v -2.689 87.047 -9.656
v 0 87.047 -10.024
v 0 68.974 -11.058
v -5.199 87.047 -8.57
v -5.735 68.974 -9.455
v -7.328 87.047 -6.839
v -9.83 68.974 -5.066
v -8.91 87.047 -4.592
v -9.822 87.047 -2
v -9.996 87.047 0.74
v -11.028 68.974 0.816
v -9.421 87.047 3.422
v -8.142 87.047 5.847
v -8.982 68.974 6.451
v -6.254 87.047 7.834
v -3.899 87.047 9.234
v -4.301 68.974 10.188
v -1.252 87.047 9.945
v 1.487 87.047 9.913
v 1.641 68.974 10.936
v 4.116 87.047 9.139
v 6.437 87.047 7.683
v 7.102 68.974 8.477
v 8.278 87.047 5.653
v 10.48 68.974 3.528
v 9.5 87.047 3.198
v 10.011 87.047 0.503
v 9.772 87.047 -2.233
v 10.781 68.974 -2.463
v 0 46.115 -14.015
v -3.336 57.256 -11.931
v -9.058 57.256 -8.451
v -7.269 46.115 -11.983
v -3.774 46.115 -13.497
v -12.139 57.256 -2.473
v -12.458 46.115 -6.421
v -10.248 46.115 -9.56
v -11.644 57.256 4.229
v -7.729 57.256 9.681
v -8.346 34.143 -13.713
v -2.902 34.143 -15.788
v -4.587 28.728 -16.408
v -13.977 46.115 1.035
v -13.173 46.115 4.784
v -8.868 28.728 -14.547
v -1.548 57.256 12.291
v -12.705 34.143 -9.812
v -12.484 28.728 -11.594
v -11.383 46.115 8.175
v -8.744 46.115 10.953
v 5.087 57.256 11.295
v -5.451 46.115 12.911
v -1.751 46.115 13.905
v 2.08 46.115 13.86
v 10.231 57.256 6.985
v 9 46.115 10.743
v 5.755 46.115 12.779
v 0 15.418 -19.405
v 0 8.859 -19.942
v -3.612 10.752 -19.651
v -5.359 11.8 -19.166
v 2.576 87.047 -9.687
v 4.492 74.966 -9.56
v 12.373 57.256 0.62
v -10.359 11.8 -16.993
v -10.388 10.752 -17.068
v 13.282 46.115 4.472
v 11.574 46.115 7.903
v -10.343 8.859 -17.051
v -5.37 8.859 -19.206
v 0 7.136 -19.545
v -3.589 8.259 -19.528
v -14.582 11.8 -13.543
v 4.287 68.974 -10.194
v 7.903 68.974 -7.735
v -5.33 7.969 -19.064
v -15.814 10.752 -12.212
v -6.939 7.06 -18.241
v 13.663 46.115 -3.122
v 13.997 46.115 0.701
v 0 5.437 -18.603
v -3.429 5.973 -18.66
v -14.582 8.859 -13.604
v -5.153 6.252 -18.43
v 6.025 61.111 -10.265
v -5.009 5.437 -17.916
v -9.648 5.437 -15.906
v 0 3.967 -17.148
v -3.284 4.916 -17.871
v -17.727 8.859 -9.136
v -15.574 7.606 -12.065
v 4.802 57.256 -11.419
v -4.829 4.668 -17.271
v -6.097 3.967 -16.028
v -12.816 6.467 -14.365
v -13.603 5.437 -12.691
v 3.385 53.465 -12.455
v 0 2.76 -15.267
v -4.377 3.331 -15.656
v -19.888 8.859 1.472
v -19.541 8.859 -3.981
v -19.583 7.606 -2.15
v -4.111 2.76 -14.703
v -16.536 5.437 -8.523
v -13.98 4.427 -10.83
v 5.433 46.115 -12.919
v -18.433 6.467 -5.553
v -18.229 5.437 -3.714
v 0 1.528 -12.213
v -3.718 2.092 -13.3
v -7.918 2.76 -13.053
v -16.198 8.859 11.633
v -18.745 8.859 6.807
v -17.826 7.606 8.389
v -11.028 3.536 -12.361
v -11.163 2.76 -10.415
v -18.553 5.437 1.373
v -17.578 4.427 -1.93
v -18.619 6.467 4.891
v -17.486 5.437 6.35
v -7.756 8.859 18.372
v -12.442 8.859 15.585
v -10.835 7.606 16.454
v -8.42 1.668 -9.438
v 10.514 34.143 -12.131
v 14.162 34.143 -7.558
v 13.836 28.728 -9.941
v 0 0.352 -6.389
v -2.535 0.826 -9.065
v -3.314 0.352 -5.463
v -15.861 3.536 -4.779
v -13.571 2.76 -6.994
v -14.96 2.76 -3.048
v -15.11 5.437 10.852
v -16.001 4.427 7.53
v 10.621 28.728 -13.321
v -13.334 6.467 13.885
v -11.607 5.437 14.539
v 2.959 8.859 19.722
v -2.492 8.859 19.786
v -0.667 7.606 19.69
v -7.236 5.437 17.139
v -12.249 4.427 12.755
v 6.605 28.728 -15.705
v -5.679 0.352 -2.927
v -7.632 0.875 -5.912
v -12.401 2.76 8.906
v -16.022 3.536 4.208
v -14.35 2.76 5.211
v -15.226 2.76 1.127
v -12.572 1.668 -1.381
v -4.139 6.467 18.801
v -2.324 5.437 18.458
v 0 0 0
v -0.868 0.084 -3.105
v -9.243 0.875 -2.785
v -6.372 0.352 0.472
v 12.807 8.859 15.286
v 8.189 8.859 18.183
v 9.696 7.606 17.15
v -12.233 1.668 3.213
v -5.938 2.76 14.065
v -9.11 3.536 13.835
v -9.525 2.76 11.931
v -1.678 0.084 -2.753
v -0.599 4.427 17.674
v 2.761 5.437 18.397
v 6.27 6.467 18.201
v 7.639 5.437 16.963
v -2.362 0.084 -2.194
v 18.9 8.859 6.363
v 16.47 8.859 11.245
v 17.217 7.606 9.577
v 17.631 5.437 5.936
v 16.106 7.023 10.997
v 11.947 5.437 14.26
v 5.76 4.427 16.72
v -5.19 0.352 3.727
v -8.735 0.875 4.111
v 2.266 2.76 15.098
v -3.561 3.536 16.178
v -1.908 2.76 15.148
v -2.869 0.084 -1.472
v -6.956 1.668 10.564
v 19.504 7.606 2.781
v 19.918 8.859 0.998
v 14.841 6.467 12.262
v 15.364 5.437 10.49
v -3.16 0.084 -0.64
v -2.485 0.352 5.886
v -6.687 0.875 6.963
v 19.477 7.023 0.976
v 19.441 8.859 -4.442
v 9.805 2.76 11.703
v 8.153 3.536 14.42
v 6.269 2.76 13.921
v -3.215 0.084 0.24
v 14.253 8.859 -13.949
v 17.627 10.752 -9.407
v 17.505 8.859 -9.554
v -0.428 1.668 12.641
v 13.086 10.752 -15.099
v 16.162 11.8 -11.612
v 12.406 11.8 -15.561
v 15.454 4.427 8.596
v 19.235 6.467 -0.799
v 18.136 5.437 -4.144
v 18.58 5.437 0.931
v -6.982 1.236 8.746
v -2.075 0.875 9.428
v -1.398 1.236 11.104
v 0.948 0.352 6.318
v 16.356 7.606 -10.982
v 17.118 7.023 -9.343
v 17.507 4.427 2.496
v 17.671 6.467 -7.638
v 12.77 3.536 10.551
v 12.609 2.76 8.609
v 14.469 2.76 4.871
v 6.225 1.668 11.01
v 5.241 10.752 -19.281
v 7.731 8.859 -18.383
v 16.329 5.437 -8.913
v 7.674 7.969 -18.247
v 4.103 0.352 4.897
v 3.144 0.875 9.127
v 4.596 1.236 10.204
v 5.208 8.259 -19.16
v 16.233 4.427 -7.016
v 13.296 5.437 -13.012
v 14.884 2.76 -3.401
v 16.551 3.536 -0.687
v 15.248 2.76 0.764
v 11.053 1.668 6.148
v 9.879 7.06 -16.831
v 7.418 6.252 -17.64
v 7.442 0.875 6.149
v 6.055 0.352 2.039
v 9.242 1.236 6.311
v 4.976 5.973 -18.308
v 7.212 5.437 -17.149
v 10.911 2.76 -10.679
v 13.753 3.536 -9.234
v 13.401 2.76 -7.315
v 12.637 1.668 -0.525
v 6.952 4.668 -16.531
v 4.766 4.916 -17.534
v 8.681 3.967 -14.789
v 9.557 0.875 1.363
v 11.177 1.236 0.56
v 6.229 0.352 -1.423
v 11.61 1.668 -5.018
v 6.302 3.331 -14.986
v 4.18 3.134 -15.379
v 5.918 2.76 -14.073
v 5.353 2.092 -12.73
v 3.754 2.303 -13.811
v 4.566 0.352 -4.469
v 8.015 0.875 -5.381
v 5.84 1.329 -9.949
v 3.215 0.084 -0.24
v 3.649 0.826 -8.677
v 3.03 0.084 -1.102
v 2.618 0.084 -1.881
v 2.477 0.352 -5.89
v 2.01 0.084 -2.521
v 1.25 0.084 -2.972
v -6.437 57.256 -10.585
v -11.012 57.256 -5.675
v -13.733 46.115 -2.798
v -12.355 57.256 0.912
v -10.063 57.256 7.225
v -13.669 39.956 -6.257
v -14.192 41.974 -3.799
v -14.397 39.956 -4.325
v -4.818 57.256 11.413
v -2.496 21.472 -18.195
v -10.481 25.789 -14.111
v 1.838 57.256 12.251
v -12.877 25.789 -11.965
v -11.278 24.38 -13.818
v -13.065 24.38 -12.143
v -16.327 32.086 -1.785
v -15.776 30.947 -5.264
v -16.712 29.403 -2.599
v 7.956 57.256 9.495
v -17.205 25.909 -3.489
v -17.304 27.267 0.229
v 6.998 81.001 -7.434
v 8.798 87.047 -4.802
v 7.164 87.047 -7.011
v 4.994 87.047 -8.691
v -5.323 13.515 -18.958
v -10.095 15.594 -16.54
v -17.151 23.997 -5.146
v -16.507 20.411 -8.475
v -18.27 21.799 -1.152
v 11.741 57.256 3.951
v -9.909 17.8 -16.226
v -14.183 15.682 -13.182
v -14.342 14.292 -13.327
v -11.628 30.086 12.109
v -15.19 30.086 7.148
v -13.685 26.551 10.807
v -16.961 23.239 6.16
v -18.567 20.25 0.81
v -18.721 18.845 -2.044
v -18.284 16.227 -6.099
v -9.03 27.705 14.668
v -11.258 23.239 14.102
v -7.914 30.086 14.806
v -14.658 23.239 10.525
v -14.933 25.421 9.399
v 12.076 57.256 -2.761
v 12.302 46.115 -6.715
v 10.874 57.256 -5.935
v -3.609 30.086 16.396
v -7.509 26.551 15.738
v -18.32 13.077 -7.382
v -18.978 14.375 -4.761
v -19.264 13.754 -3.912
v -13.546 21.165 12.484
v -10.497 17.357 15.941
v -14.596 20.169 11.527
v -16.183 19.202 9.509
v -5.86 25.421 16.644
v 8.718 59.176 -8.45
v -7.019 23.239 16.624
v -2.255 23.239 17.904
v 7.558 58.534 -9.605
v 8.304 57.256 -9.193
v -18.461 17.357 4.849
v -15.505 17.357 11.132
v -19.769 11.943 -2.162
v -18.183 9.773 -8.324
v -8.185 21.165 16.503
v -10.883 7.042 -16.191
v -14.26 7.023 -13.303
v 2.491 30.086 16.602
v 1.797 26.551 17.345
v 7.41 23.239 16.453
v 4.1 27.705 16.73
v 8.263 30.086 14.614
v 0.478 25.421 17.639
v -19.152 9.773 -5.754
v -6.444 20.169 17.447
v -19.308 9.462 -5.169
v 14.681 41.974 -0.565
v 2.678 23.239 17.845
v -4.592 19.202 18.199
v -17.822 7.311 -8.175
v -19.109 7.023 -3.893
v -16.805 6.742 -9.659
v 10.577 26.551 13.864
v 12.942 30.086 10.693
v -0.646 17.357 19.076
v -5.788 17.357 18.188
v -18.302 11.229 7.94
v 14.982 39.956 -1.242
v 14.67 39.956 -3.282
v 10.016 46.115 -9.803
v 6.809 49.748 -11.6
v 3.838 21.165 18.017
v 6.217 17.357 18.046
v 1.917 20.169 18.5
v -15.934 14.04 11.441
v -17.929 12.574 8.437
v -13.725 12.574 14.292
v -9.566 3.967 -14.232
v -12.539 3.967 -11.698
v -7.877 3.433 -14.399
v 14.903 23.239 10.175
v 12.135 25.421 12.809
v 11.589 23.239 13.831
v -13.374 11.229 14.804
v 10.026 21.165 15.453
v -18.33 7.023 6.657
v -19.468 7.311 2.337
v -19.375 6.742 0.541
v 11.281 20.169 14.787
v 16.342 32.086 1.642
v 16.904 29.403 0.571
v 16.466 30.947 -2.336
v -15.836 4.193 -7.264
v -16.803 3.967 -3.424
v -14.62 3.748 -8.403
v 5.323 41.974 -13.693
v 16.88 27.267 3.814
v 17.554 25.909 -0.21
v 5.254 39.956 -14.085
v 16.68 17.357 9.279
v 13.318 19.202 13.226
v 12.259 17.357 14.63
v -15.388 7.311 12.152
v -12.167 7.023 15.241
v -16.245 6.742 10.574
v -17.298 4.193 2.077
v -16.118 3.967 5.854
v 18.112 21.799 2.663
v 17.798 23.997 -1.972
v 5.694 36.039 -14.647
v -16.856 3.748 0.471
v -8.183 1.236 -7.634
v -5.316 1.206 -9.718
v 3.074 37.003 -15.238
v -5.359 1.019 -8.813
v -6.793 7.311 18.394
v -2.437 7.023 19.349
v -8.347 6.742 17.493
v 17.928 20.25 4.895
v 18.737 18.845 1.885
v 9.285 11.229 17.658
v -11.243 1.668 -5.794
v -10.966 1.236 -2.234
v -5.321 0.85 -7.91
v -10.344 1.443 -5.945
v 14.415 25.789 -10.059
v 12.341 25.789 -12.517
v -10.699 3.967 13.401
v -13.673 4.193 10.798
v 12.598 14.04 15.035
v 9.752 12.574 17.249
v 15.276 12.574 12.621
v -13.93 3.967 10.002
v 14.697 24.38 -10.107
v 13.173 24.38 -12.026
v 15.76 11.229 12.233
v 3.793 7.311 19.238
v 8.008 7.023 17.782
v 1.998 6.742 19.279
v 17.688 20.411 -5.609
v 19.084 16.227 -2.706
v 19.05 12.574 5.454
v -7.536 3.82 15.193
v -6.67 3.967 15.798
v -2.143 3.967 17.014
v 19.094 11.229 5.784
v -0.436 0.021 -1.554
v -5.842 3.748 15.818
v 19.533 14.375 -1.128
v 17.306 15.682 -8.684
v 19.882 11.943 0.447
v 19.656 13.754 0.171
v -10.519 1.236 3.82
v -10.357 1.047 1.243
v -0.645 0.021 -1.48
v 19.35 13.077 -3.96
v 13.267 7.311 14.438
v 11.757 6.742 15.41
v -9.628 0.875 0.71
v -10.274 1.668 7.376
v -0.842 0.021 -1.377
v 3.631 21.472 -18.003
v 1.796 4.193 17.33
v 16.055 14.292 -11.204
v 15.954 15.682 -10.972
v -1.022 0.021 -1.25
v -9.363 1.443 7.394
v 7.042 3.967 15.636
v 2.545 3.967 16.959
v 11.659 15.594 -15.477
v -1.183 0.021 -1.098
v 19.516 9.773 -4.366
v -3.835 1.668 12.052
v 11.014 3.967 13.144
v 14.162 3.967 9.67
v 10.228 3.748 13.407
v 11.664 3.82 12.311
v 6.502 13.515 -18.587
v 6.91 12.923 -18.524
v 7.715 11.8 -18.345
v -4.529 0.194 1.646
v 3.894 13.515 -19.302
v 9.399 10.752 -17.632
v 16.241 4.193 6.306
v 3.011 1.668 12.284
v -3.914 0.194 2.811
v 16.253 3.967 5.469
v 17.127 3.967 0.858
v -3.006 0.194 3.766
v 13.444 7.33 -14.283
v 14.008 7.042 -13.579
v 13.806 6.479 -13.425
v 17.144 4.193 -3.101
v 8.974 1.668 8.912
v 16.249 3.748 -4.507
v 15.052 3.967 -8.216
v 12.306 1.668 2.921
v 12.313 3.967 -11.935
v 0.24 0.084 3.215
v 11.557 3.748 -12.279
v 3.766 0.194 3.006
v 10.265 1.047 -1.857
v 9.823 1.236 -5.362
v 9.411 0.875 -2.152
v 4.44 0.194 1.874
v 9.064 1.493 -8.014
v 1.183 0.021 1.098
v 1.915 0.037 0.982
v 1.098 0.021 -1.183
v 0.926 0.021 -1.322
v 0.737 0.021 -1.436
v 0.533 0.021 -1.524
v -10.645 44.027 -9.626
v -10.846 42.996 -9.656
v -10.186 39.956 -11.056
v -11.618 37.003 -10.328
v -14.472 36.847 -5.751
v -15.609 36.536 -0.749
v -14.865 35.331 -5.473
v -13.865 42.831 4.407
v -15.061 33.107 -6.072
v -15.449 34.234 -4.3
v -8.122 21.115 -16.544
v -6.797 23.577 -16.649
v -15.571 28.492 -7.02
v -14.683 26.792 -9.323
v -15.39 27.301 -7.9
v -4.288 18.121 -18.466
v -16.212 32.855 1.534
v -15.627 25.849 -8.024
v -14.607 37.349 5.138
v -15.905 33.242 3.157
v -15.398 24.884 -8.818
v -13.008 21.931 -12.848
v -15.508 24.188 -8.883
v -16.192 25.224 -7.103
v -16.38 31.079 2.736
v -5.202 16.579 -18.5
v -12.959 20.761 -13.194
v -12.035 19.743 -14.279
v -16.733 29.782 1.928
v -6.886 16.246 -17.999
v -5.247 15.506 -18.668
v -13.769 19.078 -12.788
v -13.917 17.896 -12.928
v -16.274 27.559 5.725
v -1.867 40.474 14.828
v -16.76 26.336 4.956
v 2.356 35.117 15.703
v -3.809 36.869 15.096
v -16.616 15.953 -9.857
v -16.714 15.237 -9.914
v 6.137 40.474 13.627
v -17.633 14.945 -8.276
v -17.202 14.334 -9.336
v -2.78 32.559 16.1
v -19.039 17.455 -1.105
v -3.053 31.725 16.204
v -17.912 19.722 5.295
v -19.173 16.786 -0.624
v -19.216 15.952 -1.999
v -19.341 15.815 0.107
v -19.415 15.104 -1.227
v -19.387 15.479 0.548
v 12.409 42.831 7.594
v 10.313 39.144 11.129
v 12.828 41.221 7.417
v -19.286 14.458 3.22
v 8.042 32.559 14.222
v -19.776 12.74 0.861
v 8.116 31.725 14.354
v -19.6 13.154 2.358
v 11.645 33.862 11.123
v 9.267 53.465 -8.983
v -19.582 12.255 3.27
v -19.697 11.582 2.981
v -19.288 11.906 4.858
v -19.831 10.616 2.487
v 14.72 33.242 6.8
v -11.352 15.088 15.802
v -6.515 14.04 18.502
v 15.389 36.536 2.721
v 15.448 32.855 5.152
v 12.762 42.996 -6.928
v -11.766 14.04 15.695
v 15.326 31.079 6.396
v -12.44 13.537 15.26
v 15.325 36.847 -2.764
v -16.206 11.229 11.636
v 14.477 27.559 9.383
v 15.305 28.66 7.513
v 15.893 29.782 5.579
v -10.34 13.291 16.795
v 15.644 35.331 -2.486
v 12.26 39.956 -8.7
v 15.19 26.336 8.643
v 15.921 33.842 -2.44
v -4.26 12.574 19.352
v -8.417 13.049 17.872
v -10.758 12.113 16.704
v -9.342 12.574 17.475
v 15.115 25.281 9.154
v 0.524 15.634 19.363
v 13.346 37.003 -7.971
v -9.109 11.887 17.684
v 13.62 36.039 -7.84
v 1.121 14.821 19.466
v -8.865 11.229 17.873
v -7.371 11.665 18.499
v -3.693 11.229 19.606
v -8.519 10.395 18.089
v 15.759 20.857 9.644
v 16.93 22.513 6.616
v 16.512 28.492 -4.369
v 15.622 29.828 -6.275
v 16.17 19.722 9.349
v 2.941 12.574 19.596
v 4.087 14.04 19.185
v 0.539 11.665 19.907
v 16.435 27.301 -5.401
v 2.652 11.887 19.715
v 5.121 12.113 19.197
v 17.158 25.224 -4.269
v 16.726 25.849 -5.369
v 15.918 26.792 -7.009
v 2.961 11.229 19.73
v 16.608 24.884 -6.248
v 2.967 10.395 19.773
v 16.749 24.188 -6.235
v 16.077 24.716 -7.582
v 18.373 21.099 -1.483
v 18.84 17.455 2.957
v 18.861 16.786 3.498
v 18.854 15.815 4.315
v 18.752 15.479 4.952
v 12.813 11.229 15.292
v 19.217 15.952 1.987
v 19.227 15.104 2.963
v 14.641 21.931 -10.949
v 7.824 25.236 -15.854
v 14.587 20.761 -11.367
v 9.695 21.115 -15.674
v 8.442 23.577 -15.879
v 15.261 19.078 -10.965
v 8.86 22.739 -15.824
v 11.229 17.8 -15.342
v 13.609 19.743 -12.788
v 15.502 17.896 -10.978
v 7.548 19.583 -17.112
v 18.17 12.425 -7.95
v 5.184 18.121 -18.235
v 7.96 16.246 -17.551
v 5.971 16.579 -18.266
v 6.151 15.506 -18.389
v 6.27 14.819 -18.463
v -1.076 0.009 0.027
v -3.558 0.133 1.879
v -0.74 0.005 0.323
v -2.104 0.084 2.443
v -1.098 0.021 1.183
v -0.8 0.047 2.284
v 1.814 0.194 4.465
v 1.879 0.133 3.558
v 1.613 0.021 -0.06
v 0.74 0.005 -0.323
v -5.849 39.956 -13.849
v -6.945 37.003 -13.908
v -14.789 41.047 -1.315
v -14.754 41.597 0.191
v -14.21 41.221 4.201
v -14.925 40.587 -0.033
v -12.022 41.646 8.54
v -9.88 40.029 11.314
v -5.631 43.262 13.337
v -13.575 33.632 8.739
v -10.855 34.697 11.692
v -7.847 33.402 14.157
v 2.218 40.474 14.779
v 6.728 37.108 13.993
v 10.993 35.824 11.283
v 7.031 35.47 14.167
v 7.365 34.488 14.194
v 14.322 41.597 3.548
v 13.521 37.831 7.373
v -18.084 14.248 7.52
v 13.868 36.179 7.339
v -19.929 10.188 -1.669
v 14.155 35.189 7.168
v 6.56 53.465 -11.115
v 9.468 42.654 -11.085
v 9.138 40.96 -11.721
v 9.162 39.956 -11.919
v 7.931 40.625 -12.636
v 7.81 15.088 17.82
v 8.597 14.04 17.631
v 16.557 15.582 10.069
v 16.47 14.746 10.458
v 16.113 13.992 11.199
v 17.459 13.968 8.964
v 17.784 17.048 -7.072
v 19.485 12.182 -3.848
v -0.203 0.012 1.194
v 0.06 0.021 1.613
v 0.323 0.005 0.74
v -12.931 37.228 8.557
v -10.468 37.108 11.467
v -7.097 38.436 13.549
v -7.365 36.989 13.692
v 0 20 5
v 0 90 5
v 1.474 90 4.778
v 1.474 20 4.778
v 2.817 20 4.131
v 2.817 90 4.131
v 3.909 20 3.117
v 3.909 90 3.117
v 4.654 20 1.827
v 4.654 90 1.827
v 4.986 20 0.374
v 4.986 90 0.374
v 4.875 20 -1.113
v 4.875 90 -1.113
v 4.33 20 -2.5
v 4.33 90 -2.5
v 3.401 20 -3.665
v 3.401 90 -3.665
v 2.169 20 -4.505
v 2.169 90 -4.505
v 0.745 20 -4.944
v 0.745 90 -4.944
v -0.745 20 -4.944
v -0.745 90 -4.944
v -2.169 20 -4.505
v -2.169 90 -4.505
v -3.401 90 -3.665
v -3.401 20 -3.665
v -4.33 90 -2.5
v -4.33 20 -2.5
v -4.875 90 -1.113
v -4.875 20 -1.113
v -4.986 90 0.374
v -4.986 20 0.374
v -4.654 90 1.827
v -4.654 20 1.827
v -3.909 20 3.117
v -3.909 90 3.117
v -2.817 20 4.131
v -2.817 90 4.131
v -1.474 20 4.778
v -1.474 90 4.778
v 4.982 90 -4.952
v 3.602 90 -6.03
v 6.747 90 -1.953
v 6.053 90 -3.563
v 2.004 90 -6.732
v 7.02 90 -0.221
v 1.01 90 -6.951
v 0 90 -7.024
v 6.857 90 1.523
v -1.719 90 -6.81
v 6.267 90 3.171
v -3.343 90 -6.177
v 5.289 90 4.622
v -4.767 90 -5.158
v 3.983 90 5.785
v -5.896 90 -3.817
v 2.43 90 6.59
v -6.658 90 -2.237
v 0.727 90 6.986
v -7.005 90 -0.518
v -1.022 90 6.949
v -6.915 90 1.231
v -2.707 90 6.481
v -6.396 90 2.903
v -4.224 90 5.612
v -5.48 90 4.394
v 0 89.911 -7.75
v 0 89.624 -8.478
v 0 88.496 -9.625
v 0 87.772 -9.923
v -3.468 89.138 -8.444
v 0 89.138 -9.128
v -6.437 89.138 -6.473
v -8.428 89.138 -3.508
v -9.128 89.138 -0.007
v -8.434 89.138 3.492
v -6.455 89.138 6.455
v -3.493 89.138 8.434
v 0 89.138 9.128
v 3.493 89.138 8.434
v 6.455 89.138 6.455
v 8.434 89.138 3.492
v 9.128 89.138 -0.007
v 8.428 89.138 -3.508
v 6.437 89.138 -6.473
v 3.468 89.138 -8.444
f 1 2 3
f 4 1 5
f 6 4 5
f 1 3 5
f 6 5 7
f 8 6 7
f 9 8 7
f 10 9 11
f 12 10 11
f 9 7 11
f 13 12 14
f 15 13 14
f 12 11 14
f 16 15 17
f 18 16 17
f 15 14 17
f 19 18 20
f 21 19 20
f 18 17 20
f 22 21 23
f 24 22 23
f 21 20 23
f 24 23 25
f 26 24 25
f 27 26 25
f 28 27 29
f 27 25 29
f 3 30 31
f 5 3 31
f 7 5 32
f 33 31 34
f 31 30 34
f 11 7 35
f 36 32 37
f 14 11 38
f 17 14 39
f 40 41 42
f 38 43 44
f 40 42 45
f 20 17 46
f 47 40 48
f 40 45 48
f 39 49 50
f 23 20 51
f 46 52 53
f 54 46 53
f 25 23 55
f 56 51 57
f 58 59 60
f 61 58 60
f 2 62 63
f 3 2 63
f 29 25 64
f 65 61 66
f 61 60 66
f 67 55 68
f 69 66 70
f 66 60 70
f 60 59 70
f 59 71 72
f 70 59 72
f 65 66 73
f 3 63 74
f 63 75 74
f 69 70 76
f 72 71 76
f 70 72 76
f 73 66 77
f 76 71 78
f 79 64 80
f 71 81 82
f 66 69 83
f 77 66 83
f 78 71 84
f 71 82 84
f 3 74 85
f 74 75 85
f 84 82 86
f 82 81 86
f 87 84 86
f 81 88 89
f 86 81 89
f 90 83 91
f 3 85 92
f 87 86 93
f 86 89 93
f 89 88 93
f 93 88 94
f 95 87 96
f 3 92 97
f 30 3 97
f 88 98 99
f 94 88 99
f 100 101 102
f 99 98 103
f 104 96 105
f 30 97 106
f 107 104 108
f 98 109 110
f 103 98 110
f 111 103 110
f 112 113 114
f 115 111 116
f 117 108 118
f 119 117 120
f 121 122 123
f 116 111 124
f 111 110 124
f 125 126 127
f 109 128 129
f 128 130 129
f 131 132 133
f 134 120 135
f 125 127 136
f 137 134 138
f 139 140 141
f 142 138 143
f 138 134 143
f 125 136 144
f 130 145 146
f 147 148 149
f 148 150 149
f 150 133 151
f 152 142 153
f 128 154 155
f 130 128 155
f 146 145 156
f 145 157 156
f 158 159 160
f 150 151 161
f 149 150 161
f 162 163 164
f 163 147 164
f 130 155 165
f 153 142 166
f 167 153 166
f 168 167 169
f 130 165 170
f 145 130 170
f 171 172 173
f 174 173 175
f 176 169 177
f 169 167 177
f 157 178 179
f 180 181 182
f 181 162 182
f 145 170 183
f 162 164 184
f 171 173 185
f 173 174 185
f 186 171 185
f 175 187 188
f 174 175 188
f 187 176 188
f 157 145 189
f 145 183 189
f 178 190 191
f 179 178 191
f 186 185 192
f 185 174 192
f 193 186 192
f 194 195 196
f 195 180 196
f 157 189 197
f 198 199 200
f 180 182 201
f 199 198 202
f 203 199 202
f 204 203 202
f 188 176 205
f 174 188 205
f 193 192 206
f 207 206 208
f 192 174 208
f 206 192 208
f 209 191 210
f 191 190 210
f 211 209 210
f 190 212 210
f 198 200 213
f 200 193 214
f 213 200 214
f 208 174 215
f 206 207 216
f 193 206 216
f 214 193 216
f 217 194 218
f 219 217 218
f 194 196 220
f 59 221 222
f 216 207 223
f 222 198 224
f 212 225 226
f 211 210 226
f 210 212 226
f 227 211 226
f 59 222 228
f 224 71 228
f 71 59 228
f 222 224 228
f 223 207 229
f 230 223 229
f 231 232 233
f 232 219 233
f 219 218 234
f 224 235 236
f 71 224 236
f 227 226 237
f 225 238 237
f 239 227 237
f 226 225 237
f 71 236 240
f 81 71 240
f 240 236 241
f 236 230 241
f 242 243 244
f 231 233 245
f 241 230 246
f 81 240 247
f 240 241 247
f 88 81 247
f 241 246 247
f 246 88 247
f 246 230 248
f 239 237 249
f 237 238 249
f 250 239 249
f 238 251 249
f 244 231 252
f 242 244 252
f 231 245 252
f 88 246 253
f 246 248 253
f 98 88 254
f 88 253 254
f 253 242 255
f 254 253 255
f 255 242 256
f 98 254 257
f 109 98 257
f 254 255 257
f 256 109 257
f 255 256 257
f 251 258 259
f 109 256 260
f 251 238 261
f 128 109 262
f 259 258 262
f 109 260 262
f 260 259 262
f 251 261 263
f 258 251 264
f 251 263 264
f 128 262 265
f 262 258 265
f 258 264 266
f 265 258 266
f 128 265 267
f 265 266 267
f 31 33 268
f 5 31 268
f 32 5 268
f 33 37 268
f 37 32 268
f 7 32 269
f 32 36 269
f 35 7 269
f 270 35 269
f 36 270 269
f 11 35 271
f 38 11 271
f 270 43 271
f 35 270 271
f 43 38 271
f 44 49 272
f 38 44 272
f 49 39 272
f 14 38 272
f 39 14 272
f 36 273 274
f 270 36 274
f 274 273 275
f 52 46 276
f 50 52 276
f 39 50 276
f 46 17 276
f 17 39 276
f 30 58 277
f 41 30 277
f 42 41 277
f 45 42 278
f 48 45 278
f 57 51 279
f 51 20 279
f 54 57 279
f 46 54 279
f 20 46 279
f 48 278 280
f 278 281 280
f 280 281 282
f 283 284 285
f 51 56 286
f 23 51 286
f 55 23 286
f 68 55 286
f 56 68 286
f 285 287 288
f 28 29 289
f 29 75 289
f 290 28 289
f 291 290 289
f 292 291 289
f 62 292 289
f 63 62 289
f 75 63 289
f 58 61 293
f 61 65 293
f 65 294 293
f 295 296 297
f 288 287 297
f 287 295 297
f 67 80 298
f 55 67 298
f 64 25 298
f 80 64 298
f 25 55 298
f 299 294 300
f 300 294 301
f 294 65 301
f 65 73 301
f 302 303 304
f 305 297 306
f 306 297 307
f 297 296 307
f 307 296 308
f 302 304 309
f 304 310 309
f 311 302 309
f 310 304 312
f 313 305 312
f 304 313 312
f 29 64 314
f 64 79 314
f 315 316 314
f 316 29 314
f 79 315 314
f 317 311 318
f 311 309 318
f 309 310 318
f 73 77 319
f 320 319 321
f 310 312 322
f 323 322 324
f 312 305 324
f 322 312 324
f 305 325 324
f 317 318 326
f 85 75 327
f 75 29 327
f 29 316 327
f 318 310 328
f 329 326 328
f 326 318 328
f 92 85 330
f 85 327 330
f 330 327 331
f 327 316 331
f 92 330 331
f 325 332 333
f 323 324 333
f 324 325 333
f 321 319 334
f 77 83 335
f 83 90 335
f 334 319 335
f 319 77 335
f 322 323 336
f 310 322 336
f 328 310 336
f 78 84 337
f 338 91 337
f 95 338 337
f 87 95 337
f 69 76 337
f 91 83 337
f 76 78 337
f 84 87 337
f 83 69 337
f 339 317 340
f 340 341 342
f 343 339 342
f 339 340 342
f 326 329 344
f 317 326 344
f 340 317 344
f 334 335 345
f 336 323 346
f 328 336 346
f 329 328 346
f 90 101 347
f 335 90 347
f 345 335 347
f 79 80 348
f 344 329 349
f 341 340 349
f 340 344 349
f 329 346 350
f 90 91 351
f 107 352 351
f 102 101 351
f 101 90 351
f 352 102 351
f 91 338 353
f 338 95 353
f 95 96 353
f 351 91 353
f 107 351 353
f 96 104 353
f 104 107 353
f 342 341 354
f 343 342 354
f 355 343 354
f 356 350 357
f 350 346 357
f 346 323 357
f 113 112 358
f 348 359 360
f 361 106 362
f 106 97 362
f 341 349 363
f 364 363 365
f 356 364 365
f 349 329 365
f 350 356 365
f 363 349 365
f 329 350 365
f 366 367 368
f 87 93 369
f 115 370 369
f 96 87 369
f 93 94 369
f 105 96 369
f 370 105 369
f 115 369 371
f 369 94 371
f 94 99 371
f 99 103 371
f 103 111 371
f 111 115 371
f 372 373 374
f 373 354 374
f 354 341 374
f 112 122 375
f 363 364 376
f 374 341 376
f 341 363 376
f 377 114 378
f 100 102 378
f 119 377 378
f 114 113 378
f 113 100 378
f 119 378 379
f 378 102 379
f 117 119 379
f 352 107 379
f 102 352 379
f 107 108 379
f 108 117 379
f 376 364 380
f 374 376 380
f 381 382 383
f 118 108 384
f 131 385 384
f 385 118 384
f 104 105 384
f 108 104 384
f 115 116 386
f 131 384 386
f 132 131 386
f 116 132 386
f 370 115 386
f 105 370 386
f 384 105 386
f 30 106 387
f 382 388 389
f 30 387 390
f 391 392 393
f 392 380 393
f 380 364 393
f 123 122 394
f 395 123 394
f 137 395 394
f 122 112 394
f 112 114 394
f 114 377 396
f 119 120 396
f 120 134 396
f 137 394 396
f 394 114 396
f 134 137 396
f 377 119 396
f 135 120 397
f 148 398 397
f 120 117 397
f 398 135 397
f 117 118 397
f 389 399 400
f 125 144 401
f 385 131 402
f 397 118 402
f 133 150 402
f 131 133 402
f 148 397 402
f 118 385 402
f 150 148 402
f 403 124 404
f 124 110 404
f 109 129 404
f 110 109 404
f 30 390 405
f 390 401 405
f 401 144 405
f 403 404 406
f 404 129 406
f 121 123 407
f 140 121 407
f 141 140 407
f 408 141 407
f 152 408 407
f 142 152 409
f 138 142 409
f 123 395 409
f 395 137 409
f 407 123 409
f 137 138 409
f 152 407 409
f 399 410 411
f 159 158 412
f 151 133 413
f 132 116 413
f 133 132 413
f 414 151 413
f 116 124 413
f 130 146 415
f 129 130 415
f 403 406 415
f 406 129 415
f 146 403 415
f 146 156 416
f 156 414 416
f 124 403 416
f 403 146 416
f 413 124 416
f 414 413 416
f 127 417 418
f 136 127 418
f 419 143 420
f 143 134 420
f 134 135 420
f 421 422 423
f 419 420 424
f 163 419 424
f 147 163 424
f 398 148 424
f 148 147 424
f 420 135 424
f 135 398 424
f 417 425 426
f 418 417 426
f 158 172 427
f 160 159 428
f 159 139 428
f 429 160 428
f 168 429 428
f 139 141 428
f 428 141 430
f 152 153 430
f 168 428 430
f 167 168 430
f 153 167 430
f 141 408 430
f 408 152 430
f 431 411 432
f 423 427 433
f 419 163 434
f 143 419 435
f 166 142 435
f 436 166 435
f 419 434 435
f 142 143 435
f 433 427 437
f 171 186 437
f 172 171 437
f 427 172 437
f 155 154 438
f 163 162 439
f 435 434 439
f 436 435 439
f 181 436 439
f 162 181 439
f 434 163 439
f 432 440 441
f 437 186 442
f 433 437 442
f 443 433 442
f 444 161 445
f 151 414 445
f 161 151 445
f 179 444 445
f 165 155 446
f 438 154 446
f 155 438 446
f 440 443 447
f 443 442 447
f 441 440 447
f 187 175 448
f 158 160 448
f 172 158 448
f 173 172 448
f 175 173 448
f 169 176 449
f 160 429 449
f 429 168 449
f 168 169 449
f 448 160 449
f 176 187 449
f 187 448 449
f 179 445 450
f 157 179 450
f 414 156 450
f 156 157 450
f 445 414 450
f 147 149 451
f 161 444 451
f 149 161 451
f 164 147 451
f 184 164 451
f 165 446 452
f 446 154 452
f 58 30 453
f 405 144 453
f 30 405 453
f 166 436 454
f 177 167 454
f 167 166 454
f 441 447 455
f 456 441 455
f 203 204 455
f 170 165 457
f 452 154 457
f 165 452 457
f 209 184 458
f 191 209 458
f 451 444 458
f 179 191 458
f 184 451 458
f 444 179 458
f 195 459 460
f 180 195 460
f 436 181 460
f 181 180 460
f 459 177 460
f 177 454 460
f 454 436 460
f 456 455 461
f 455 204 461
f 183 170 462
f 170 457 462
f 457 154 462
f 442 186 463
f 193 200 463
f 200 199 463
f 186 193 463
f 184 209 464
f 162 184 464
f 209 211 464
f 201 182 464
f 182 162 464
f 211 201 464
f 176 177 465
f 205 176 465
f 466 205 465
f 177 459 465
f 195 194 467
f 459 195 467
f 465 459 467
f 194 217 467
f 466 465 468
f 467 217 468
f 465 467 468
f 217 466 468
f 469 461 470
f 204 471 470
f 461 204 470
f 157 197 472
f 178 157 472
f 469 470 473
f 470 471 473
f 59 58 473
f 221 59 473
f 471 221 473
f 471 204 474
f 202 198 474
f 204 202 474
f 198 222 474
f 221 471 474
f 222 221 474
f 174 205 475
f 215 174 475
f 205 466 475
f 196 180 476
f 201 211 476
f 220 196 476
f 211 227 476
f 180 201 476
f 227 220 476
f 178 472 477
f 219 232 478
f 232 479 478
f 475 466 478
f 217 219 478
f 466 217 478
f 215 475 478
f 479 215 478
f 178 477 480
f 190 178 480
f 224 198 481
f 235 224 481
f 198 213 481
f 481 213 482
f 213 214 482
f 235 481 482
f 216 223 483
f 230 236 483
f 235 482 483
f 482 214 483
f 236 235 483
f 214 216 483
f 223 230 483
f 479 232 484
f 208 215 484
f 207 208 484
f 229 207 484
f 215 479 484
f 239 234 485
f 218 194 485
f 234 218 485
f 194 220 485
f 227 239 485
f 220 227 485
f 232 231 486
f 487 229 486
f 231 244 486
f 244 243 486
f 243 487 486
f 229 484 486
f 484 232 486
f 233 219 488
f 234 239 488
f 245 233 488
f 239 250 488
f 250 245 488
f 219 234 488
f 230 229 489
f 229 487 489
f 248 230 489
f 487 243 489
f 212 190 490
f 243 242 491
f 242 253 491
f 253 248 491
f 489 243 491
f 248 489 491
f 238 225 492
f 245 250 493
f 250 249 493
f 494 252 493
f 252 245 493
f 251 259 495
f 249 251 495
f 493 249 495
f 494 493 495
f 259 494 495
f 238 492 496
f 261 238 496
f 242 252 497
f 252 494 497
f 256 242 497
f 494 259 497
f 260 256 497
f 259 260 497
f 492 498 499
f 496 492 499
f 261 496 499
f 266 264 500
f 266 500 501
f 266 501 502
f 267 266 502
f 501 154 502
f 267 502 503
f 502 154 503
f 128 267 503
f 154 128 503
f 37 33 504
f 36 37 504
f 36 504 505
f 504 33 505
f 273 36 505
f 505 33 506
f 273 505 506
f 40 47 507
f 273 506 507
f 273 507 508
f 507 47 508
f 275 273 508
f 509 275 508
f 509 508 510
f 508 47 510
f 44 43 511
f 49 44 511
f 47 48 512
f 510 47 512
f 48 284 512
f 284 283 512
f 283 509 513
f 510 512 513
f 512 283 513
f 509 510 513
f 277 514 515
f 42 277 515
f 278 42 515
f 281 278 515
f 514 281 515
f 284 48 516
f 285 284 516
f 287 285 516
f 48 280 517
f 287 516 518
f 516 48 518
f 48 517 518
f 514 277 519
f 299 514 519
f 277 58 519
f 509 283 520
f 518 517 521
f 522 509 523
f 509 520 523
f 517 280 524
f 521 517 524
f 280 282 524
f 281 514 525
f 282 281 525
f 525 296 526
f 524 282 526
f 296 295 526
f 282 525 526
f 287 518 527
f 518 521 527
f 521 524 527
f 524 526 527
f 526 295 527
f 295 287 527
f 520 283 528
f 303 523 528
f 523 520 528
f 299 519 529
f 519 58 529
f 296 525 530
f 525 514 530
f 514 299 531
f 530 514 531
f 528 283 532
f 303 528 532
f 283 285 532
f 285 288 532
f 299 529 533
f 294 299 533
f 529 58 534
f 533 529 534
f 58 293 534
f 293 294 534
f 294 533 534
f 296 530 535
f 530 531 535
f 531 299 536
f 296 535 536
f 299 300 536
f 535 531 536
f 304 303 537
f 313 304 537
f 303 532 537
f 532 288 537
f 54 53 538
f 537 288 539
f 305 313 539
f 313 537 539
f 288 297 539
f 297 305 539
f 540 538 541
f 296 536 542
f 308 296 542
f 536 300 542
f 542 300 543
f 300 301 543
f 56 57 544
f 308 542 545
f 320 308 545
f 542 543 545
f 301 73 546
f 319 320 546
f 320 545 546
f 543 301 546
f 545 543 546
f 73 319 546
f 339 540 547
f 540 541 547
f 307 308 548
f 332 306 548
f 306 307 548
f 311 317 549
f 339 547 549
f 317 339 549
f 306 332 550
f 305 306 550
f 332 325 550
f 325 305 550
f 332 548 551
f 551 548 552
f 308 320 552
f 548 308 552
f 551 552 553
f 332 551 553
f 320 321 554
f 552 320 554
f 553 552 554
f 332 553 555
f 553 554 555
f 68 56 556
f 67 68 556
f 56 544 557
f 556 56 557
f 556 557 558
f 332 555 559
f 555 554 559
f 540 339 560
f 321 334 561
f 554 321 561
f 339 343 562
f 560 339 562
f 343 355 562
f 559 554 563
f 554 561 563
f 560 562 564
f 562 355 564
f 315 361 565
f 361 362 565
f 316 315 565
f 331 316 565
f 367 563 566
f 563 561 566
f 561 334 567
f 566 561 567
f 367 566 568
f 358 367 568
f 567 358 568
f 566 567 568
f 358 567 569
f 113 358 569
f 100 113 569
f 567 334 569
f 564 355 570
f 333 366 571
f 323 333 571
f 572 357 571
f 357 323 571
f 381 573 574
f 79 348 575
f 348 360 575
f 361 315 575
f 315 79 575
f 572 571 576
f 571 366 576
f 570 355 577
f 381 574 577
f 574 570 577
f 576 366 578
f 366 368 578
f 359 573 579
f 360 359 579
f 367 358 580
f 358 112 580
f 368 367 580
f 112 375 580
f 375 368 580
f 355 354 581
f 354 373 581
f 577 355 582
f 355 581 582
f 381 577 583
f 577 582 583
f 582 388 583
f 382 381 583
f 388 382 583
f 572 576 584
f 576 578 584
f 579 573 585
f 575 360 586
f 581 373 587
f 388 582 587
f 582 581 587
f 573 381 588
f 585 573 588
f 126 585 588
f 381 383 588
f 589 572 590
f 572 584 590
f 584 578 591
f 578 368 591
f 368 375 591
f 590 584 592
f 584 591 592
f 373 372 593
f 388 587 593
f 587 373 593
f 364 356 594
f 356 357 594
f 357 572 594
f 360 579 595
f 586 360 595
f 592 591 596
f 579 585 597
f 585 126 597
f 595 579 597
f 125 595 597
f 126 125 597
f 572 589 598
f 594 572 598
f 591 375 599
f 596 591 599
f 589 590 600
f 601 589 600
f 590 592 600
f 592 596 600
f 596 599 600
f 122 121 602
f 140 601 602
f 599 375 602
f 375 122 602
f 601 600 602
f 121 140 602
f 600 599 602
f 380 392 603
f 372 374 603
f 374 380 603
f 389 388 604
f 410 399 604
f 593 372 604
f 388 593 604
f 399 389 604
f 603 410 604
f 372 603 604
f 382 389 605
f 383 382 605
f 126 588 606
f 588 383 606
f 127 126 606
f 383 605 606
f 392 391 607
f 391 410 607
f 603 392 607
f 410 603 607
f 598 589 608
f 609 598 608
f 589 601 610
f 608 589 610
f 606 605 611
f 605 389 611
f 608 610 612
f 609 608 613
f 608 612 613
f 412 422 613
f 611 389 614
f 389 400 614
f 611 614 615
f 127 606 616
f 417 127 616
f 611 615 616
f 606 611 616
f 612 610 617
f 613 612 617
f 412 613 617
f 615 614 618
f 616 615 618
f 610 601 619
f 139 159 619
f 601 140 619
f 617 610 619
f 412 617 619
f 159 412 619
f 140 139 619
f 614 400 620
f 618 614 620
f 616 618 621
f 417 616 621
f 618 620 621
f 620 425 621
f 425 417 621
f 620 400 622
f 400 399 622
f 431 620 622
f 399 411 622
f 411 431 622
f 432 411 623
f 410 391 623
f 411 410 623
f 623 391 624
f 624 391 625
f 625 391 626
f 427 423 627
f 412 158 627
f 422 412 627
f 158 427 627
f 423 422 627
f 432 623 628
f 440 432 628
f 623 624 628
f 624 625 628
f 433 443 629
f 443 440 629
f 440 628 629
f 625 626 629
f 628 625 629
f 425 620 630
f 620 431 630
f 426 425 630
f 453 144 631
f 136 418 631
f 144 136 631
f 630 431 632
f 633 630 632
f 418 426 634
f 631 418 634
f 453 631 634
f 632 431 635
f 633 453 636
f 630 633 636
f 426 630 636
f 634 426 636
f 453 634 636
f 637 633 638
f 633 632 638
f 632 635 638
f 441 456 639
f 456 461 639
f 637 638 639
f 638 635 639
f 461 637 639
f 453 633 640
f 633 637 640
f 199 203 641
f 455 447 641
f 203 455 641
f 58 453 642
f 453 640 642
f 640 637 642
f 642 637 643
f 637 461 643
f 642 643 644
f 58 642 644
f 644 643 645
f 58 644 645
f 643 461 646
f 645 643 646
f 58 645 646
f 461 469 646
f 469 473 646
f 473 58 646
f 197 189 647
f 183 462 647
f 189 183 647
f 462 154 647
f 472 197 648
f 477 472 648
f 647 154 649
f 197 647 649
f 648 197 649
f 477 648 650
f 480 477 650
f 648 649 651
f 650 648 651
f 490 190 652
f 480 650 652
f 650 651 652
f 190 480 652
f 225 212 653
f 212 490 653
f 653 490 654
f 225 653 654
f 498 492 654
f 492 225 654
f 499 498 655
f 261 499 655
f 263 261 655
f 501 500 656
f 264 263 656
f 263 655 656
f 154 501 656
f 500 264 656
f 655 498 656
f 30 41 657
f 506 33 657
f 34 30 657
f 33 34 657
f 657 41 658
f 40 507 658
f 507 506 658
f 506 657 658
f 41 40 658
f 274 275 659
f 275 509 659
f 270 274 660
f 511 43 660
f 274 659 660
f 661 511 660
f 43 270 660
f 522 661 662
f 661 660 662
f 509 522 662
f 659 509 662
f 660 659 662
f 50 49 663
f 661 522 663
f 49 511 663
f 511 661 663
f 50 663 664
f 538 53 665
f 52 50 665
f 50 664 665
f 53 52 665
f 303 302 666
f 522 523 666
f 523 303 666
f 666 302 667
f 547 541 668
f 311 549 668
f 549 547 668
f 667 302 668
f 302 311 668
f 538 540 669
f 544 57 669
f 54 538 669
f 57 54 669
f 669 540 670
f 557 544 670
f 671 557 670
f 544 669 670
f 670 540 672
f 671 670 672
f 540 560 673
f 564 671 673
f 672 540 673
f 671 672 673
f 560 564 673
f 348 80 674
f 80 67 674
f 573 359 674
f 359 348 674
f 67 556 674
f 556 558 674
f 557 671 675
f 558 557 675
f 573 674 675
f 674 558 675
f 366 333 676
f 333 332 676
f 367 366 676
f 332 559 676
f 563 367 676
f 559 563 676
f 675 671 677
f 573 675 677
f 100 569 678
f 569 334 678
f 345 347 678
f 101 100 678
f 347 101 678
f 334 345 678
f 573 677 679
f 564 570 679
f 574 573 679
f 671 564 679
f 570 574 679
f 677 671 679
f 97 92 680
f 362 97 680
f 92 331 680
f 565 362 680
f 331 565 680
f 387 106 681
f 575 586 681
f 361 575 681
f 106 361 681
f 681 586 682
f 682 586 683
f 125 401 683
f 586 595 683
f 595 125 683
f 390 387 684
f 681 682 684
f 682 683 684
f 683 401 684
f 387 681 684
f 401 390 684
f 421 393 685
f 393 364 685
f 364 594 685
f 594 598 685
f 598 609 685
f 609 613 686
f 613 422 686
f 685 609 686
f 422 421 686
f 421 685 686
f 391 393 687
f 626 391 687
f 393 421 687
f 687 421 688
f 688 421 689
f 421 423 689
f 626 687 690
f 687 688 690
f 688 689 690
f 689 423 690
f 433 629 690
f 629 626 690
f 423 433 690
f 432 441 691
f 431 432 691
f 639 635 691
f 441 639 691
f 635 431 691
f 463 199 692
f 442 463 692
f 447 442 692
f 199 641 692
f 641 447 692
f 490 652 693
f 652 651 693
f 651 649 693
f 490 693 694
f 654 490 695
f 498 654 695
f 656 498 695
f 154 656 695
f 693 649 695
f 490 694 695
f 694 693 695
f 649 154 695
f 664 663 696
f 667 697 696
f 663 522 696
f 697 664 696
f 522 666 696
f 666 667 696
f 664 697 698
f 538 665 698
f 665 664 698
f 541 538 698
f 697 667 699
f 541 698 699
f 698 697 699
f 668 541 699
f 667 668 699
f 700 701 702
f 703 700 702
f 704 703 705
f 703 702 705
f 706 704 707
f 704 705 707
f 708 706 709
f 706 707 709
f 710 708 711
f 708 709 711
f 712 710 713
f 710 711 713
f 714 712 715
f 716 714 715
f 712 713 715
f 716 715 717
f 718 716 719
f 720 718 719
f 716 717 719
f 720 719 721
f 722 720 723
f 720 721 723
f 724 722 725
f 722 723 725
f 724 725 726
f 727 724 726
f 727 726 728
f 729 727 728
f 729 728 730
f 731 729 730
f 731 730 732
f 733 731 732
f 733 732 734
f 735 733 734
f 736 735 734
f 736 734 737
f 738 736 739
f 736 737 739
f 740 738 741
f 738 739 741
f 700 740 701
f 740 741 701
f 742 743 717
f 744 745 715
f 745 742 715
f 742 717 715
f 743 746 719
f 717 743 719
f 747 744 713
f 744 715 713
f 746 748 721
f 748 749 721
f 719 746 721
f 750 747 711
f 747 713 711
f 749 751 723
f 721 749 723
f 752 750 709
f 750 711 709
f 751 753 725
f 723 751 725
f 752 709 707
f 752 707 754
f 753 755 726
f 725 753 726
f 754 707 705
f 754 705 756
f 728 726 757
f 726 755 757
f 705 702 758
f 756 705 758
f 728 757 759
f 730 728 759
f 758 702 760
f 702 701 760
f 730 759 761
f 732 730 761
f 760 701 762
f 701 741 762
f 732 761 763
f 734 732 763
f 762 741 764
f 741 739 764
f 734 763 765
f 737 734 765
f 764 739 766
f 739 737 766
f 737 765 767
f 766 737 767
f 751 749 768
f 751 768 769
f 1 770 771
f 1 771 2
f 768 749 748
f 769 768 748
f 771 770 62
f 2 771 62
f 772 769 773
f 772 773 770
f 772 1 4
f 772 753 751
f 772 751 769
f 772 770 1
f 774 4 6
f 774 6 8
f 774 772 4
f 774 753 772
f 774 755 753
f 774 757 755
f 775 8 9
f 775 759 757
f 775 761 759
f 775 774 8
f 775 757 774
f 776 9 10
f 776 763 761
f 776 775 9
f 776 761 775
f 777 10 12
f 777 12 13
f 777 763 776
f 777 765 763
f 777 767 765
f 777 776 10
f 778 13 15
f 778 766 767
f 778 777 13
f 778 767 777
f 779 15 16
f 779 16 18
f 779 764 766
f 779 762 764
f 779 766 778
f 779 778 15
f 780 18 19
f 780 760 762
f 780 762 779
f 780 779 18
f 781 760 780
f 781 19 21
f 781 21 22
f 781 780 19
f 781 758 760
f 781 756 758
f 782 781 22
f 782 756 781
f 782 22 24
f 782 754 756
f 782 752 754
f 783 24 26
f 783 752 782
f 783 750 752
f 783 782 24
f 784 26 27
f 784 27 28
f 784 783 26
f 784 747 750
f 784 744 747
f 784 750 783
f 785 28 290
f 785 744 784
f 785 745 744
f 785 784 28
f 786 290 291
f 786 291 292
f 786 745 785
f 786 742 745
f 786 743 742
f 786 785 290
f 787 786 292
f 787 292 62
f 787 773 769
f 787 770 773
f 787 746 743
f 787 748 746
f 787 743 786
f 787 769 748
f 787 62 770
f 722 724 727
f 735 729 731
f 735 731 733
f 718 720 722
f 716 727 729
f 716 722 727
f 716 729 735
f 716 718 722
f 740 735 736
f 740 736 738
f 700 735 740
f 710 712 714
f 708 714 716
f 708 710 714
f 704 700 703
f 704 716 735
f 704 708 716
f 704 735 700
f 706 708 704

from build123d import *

# Parameters (mm, degrees)
SKETCH2_R          = 5
CUT_EXTRUDE2_DEPTH = 70
FILLET1_R          = 3


with BuildPart() as part:
    # Sketch1 → Revolve1 (revolve)
    with BuildSketch(Plane(origin=(0, 0, 0), x_dir=(0, 0, -1), z_dir=(1, 0, 0))):
        with BuildLine():
            Line((0, 0), (0, 90))
            Line((0, 90), (10, 90))
            add(Edge.make_bspline(
                [(10, 90), (10, 60), (18.819759302, 22.8052024), (20.928757216, 2.414876553), (9, 0), (0, 0)],
                knots=[0, 0, 0, 0, 0.550031467, 0.650031467, 1, 1, 1, 1], degree=3))
        make_face()
    revolve(axis=Axis((0, 0, 0), (0, 1, 0)))

    # Sketch2 → Cut-Extrude2 (cut)
    with BuildSketch(Plane(origin=(0, 90, 0), x_dir=(1, 0, 0), z_dir=(0, 1, 0))):
        with Locations(Location((0, 0, 0), (0, 0, 270))):
            Circle(SKETCH2_R)
    extrude(amount=-CUT_EXTRUDE2_DEPTH, mode=Mode.SUBTRACT)

    # Fillet1
    fillet1_edges = [part.edges().sort_by_distance(p)[0] for p in [
        (0, 90, 10),
    ]]
    fillet(fillet1_edges, radius=FILLET1_R)


solid = part.part
